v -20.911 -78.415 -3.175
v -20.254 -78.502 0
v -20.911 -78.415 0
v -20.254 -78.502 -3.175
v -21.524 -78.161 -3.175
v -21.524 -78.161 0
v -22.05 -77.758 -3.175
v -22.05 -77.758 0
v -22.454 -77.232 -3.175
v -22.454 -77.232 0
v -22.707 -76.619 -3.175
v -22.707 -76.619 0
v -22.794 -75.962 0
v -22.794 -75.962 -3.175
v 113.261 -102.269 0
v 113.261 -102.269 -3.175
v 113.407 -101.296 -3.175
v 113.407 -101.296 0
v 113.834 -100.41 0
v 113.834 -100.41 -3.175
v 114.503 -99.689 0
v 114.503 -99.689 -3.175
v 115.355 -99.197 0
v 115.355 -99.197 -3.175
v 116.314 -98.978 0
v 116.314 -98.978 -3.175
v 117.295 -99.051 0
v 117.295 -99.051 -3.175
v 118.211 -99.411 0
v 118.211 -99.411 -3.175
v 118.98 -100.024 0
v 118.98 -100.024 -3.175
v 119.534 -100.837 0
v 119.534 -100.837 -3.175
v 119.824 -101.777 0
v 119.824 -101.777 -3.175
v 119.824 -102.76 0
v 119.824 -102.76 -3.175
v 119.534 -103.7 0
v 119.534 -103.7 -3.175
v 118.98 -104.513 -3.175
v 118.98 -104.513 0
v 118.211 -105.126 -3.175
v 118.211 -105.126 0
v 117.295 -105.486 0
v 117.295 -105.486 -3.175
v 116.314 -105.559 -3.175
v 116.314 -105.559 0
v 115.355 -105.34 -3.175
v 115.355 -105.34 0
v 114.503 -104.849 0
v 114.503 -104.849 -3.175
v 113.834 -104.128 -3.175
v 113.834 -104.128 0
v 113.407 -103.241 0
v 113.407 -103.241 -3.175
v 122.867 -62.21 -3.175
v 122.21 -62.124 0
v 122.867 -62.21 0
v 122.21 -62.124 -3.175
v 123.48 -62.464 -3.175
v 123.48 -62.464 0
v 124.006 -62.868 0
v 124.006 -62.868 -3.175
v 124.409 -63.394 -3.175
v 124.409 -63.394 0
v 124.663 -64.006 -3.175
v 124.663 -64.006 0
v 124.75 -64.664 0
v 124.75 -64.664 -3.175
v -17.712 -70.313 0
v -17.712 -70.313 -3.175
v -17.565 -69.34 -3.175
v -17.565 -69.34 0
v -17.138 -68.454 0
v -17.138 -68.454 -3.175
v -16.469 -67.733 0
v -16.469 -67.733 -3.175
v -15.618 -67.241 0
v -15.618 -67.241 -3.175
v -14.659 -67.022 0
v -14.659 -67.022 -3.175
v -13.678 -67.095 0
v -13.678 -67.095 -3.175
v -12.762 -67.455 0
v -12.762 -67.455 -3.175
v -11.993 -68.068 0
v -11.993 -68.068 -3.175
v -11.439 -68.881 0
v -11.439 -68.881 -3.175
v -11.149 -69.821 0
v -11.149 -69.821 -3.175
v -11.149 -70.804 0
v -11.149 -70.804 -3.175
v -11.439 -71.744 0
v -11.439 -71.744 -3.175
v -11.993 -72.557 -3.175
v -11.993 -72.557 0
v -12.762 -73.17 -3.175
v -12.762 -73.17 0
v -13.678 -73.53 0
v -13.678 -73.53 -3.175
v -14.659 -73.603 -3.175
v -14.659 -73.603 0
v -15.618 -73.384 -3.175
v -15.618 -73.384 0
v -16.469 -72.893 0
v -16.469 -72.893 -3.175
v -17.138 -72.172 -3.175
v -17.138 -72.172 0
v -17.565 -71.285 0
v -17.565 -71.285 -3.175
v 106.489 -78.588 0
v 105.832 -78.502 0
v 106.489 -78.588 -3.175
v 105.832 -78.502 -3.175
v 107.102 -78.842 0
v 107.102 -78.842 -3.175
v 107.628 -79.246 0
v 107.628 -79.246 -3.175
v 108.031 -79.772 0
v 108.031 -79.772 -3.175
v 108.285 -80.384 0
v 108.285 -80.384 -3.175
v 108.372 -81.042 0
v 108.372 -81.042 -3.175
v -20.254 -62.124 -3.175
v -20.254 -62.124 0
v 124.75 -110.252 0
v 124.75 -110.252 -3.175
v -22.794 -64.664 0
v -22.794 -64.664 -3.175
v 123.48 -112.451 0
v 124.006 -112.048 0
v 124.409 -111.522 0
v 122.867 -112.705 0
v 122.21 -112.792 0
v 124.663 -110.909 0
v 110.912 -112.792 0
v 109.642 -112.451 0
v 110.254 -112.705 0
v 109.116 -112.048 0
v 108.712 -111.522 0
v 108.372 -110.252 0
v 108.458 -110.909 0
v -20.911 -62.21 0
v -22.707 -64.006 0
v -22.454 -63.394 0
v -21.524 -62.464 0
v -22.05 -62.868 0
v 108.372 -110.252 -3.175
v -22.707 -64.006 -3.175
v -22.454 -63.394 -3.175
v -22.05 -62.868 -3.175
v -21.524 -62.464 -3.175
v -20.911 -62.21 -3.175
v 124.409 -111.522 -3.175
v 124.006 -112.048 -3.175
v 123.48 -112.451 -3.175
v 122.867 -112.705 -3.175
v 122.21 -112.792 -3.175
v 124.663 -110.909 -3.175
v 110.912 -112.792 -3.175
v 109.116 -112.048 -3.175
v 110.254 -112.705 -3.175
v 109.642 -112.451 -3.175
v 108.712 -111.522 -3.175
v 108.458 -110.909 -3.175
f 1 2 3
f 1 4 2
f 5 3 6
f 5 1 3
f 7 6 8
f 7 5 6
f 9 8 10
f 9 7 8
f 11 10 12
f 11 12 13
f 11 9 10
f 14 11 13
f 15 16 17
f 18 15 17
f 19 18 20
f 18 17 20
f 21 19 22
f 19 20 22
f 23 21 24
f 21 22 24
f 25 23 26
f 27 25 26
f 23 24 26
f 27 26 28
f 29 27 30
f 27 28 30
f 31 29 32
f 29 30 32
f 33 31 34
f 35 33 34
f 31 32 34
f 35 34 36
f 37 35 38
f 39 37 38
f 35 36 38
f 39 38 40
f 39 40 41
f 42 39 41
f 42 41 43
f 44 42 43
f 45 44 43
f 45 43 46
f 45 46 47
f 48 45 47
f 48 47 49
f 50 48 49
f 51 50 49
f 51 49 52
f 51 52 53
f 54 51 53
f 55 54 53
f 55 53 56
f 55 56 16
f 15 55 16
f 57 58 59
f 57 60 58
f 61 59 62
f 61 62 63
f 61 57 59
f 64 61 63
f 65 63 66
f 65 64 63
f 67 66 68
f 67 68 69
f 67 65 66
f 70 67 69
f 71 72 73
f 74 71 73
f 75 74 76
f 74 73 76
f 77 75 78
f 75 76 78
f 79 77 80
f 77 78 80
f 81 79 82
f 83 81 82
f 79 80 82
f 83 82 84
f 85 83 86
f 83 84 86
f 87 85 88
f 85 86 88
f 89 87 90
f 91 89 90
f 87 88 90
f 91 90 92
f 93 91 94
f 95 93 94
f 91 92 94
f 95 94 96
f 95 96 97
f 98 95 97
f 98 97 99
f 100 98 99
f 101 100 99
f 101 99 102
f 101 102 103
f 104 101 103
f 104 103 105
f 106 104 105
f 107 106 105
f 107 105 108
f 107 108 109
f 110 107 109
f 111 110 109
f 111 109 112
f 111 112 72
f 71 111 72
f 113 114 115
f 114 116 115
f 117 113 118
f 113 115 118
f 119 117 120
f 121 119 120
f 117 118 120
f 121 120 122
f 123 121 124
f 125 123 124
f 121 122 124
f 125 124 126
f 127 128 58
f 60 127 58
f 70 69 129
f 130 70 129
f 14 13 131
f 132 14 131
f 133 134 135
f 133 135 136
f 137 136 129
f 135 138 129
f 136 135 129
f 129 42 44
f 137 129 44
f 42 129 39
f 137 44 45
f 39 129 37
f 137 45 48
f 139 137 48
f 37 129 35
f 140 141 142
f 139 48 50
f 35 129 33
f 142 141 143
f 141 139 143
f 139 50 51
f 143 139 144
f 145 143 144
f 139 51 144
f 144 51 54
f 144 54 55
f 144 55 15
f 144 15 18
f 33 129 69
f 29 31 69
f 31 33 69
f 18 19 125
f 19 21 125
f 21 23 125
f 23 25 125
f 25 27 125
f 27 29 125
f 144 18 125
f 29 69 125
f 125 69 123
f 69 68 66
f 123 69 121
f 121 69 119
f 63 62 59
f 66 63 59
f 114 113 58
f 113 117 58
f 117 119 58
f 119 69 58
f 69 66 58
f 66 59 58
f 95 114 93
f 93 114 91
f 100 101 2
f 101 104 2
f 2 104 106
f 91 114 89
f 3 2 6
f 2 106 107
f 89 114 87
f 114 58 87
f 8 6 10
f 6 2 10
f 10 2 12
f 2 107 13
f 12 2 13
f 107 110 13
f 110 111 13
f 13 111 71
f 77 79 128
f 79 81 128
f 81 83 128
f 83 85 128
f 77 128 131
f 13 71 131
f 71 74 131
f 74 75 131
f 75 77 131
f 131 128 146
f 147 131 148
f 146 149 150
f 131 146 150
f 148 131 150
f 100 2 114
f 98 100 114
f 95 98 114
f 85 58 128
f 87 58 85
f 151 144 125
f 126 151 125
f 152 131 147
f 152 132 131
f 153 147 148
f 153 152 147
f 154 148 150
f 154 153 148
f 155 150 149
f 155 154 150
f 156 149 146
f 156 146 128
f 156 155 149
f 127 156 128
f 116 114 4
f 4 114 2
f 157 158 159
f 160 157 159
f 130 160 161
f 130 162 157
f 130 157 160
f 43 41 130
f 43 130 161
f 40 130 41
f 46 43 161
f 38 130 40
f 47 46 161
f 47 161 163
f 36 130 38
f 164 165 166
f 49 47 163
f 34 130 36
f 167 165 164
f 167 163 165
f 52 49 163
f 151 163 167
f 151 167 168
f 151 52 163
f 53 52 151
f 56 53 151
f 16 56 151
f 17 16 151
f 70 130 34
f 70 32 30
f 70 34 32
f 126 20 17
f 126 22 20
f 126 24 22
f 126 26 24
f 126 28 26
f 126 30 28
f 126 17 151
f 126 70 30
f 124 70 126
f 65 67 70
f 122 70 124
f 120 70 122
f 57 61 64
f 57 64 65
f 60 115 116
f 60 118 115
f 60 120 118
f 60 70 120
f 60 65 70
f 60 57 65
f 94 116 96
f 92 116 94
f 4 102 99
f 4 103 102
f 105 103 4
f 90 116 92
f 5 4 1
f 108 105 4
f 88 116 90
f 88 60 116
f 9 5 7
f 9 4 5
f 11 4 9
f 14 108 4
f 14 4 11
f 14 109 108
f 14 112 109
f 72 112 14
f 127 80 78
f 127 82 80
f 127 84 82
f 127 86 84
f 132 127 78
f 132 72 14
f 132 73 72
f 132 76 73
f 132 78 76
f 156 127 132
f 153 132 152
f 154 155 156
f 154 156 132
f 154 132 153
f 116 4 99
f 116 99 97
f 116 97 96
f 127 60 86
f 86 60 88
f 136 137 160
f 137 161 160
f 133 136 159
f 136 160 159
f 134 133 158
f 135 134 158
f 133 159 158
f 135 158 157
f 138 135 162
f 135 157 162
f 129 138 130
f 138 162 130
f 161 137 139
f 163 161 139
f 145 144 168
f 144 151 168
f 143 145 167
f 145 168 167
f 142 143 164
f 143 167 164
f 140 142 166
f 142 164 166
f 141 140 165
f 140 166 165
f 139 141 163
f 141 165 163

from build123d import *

# Parameters (mm, degrees)
BASE_FLANGE1_DEPTH   = 3.175
M6_CLEARANCE_HOLE1_D = 6.6
FILLET1_R            = 2.54


# Sheet-metal steps are written as plain solids
with BuildPart() as part:
    # Sketch1 → Base-Flange1 (new body)
    with BuildSketch(Plane.XY):
        Polygon((108.371719048, -78.501600001), (-22.7939, -78.501600001), (-22.7939, -62.123600001), (124.749719048, -62.123600001), (124.749719048, -112.791600001), (108.371719048, -112.791600001), align=None)
    extrude(amount=-BASE_FLANGE1_DEPTH)

    # M6 Clearance Hole1 (through all)
    with Locations(Plane.XY):
        with Locations((-14.4119, -70.312600001), (116.560719048, -102.268610498)):
            Hole(M6_CLEARANCE_HOLE1_D / 2)

    # Fillet1
    fillet1_edges = [part.edges().sort_by_distance(p)[0] for p in [
        (-22.7939, -62.123600001, -1.5875),
        (124.749719048, -62.123600001, -1.5875),
        (124.749719048, -112.791600001, -1.5875),
        (108.371719048, -112.791600001, -1.5875),
        (108.371719048, -78.501600001, -1.5875),
        (-22.7939, -78.501600001, -1.5875),
    ]]
    fillet(fillet1_edges, radius=FILLET1_R)


solid = part.part
